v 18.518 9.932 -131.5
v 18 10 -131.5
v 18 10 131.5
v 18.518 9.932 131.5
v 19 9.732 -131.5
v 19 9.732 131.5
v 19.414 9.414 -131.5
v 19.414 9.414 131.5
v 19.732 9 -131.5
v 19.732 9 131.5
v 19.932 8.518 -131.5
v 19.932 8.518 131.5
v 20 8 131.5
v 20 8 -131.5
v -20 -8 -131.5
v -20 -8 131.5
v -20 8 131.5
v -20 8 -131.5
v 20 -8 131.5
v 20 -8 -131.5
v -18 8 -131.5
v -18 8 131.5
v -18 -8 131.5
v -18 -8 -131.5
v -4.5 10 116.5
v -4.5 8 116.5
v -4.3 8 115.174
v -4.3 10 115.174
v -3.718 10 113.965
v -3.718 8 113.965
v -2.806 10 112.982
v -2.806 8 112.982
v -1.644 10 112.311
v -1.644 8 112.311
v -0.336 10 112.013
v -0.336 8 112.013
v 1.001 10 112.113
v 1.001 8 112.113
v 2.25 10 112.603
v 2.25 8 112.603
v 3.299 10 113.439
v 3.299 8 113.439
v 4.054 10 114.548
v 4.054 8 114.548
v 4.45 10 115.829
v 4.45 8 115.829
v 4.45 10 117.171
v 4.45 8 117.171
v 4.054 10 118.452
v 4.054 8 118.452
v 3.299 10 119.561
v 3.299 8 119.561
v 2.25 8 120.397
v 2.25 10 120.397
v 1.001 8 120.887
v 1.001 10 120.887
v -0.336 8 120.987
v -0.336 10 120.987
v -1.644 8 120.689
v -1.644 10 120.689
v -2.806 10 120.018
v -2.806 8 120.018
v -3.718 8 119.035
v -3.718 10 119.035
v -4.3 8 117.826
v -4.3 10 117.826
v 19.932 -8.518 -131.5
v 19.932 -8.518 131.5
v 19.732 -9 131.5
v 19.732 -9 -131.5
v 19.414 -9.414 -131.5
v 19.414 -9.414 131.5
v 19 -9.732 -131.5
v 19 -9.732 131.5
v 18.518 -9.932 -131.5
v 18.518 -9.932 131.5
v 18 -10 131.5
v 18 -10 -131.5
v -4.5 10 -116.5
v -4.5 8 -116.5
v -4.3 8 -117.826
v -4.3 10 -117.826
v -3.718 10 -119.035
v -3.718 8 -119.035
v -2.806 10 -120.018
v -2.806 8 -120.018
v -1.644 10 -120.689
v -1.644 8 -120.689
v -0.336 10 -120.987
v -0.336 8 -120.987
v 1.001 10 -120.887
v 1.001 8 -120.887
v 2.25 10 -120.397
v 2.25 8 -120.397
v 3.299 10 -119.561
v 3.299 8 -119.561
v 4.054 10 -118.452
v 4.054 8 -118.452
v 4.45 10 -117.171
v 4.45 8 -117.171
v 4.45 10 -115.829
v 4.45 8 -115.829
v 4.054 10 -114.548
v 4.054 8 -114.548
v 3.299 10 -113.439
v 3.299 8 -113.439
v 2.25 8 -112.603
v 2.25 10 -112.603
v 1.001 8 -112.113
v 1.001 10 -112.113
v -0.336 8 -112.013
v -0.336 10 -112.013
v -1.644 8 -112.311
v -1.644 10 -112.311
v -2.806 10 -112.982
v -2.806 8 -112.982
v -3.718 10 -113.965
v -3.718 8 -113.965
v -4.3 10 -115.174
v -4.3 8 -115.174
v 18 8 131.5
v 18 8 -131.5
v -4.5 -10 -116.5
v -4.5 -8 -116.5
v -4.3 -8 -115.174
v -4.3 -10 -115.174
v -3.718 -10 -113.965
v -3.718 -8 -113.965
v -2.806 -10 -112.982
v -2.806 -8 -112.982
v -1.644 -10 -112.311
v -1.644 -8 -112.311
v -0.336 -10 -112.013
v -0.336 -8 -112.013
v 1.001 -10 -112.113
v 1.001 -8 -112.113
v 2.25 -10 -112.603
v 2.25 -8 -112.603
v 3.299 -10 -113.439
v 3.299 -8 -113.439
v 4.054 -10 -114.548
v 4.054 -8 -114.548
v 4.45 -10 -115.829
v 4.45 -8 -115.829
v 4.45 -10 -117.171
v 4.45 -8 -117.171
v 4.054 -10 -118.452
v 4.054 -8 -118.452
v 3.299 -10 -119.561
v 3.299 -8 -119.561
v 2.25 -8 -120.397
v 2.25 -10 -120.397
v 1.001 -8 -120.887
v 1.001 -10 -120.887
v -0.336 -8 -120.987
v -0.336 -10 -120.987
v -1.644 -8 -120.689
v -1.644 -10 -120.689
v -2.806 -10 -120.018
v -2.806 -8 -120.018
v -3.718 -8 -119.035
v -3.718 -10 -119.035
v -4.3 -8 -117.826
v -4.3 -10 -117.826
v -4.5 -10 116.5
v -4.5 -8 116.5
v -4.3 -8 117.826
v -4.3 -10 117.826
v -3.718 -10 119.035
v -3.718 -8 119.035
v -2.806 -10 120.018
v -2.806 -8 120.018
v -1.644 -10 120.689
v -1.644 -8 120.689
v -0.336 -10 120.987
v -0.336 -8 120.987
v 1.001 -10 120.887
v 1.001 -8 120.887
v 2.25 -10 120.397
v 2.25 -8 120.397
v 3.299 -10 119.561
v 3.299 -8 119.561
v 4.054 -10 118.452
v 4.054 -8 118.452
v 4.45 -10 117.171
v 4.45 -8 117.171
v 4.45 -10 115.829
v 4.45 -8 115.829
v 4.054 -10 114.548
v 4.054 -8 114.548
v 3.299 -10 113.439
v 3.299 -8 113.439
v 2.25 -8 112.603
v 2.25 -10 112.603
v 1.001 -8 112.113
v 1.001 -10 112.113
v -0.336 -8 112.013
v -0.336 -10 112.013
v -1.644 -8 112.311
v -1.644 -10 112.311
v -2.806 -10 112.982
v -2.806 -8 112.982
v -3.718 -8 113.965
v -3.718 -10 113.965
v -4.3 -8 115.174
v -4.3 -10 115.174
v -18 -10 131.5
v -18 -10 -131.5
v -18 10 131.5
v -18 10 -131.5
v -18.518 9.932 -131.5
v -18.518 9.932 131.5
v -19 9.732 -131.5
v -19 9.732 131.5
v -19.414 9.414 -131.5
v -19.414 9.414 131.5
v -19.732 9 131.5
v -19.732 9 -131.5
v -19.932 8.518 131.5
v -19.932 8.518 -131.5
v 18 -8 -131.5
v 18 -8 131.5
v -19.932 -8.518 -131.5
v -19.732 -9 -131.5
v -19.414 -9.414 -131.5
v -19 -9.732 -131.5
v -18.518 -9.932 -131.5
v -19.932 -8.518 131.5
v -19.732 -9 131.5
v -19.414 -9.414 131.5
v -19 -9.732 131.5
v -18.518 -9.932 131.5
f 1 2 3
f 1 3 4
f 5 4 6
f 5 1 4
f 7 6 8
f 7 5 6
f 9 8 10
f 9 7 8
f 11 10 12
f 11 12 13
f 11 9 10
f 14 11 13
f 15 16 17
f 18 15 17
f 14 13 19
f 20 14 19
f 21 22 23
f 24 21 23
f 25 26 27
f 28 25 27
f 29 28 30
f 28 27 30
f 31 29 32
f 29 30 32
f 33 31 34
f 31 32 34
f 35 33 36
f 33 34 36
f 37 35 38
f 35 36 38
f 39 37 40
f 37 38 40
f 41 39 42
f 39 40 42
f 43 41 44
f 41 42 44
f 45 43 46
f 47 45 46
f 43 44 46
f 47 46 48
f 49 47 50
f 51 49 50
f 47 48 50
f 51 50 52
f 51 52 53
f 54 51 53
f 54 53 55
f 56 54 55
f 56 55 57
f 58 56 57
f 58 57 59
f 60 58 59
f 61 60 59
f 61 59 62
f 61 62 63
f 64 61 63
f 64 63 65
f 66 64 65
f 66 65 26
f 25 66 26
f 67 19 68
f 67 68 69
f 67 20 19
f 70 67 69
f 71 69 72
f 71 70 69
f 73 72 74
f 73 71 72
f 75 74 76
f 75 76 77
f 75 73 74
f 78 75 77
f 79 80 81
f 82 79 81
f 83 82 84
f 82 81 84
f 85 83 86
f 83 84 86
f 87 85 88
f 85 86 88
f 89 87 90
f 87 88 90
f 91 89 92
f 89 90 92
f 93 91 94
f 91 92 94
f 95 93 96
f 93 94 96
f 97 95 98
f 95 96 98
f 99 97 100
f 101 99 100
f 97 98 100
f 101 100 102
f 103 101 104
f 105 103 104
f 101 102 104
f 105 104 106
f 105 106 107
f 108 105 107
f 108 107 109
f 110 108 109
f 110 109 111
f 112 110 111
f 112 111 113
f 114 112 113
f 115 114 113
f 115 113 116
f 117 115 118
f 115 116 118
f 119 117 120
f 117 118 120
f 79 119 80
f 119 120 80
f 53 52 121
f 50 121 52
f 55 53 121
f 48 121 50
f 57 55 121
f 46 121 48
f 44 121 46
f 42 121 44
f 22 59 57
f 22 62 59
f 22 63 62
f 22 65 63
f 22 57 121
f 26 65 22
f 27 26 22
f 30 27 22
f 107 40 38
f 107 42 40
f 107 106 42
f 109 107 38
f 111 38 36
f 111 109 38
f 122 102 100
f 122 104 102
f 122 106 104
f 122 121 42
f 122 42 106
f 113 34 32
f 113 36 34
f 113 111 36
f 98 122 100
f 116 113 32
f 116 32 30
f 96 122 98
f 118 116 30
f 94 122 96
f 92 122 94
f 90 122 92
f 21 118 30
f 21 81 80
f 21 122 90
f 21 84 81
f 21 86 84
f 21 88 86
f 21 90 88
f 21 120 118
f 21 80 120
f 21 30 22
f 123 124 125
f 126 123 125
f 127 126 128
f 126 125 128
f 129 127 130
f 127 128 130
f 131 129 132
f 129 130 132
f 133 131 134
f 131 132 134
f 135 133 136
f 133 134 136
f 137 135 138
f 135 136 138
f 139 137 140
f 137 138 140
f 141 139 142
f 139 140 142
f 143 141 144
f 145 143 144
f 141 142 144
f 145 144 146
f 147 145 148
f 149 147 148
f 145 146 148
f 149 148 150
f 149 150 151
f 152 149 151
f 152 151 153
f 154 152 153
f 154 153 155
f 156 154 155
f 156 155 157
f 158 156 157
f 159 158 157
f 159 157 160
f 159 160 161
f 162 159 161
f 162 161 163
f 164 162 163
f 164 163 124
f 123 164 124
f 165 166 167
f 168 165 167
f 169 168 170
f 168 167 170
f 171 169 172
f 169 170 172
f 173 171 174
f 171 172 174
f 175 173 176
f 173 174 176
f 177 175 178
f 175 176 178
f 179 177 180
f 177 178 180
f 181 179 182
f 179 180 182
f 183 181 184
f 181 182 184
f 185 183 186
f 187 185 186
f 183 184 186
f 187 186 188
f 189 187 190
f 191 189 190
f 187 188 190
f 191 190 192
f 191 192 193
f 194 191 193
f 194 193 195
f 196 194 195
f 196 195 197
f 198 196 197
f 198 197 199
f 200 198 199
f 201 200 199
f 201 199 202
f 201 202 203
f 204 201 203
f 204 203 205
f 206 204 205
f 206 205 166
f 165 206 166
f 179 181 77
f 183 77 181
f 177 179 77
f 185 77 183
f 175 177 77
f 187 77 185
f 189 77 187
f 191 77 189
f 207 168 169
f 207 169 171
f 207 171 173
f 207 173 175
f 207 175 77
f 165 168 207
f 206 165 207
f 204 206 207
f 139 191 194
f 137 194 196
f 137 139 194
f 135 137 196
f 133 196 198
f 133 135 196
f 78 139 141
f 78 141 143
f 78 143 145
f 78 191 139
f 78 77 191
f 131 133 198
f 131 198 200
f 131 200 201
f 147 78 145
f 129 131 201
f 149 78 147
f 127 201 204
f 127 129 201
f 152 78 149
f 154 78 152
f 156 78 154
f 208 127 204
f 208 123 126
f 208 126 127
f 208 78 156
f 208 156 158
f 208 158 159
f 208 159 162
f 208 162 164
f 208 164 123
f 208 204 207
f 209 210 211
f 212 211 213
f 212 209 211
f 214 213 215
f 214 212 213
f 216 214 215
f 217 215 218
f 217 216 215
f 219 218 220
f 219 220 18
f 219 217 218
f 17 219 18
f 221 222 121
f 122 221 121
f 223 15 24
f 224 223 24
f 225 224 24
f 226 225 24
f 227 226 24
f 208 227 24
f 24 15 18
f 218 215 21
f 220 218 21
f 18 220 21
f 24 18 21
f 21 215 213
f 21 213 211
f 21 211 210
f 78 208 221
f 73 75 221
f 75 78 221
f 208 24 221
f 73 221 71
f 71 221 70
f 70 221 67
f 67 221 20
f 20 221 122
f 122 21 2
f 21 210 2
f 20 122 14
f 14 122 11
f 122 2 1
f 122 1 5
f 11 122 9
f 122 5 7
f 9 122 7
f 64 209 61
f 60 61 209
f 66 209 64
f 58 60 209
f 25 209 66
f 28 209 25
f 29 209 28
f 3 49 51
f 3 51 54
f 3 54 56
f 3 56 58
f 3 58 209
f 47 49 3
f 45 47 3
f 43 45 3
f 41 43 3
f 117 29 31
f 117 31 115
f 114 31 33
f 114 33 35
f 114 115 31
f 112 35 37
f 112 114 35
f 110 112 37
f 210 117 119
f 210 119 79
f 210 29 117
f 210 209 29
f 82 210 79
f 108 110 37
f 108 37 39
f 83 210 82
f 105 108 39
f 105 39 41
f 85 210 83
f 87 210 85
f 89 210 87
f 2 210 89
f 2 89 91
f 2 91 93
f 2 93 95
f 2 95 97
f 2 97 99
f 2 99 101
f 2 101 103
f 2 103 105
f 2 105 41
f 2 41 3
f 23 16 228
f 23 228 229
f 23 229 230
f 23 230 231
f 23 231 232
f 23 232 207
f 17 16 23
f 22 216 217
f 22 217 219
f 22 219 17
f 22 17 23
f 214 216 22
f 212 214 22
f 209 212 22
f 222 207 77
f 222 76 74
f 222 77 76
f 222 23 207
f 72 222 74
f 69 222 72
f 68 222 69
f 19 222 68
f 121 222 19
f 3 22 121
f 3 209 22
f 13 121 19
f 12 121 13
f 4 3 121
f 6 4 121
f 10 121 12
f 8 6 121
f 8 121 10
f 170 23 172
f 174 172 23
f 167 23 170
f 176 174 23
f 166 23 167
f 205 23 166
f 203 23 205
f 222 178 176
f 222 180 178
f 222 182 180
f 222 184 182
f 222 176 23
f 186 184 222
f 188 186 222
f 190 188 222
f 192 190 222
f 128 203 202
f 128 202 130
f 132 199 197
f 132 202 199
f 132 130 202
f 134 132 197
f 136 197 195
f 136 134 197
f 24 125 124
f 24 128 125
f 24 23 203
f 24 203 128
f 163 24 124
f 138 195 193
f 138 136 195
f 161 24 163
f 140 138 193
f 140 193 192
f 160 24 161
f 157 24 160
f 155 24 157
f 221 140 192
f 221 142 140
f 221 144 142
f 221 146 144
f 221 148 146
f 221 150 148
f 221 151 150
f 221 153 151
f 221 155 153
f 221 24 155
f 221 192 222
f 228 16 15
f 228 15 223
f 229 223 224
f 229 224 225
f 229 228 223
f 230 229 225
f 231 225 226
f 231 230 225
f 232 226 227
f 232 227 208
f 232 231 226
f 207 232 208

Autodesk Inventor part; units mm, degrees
ref_plane "YZ Plane" through (0, 0, 0) normal (1, 0, 0) x (0, 1, 0)
ref_plane "XZ Plane" through (0, 0, 0) normal (0, 1, 0) x (-1, 0, 0)
ref_plane "XY Plane" through (0, 0, 0) normal (0, 0, 1) x (1, 0, 0)
sketch "Sketch1" plane through (0, 0, 0) normal (0, 0, 1) x (1, 0, 0)
  line L0 (-20, 10) -> (20, 10)
  line L1 (20, 10) -> (20, -10)
  line L2 (20, -10) -> (-20, -10)
  line L3 (-20, -10) -> (-20, 10)
  line L4 (-20, 10) -> (20, -10) construction
  line L5 (20, 10) -> (-20, -10) construction
  line L6 (18, 8) -> (-18, 8)
  line L7 (-18, 8) -> (-18, -8)
  line L8 (-18, -8) -> (18, -8)
  line L9 (18, -8) -> (18, 8)
  point P0 (0, 0)
  dimension "d0" = 40
  dimension "d1" = 20
  dimension "d2" = 2
extrude "Extrusion1" add sketch "Sketch1" along normal mid plane 263
fillet "Fillet1" radius 2 4 edges at (-20, 10, 0) (-20, -10, 0) (20, -10, 0) (20, 10, 0)
sketch "Sketch4" plane through (0, 0, 0) normal (0, 1, 0) x (-1, 0, 0)
  line L0 (18, 131.5) -> (-18, 131.5) projected
  line L1 (-18, -131.5) -> (18, -131.5) projected
  circle A0 centre (0, 116.5) radius 4.5
  circle A1 centre (0, -116.5) radius 4.5
  line L2 (48.8004, 0) -> (-48.8004, 0) construction
  point P0 (0, 0)
  point P1 (0, 0)
  dimension "d20" = 9
  dimension "d21" = 15
extrude "Extrusion4" cut sketch "Sketch4" along normal through all both and the other way through all
properties part number "Leg tube 2"
